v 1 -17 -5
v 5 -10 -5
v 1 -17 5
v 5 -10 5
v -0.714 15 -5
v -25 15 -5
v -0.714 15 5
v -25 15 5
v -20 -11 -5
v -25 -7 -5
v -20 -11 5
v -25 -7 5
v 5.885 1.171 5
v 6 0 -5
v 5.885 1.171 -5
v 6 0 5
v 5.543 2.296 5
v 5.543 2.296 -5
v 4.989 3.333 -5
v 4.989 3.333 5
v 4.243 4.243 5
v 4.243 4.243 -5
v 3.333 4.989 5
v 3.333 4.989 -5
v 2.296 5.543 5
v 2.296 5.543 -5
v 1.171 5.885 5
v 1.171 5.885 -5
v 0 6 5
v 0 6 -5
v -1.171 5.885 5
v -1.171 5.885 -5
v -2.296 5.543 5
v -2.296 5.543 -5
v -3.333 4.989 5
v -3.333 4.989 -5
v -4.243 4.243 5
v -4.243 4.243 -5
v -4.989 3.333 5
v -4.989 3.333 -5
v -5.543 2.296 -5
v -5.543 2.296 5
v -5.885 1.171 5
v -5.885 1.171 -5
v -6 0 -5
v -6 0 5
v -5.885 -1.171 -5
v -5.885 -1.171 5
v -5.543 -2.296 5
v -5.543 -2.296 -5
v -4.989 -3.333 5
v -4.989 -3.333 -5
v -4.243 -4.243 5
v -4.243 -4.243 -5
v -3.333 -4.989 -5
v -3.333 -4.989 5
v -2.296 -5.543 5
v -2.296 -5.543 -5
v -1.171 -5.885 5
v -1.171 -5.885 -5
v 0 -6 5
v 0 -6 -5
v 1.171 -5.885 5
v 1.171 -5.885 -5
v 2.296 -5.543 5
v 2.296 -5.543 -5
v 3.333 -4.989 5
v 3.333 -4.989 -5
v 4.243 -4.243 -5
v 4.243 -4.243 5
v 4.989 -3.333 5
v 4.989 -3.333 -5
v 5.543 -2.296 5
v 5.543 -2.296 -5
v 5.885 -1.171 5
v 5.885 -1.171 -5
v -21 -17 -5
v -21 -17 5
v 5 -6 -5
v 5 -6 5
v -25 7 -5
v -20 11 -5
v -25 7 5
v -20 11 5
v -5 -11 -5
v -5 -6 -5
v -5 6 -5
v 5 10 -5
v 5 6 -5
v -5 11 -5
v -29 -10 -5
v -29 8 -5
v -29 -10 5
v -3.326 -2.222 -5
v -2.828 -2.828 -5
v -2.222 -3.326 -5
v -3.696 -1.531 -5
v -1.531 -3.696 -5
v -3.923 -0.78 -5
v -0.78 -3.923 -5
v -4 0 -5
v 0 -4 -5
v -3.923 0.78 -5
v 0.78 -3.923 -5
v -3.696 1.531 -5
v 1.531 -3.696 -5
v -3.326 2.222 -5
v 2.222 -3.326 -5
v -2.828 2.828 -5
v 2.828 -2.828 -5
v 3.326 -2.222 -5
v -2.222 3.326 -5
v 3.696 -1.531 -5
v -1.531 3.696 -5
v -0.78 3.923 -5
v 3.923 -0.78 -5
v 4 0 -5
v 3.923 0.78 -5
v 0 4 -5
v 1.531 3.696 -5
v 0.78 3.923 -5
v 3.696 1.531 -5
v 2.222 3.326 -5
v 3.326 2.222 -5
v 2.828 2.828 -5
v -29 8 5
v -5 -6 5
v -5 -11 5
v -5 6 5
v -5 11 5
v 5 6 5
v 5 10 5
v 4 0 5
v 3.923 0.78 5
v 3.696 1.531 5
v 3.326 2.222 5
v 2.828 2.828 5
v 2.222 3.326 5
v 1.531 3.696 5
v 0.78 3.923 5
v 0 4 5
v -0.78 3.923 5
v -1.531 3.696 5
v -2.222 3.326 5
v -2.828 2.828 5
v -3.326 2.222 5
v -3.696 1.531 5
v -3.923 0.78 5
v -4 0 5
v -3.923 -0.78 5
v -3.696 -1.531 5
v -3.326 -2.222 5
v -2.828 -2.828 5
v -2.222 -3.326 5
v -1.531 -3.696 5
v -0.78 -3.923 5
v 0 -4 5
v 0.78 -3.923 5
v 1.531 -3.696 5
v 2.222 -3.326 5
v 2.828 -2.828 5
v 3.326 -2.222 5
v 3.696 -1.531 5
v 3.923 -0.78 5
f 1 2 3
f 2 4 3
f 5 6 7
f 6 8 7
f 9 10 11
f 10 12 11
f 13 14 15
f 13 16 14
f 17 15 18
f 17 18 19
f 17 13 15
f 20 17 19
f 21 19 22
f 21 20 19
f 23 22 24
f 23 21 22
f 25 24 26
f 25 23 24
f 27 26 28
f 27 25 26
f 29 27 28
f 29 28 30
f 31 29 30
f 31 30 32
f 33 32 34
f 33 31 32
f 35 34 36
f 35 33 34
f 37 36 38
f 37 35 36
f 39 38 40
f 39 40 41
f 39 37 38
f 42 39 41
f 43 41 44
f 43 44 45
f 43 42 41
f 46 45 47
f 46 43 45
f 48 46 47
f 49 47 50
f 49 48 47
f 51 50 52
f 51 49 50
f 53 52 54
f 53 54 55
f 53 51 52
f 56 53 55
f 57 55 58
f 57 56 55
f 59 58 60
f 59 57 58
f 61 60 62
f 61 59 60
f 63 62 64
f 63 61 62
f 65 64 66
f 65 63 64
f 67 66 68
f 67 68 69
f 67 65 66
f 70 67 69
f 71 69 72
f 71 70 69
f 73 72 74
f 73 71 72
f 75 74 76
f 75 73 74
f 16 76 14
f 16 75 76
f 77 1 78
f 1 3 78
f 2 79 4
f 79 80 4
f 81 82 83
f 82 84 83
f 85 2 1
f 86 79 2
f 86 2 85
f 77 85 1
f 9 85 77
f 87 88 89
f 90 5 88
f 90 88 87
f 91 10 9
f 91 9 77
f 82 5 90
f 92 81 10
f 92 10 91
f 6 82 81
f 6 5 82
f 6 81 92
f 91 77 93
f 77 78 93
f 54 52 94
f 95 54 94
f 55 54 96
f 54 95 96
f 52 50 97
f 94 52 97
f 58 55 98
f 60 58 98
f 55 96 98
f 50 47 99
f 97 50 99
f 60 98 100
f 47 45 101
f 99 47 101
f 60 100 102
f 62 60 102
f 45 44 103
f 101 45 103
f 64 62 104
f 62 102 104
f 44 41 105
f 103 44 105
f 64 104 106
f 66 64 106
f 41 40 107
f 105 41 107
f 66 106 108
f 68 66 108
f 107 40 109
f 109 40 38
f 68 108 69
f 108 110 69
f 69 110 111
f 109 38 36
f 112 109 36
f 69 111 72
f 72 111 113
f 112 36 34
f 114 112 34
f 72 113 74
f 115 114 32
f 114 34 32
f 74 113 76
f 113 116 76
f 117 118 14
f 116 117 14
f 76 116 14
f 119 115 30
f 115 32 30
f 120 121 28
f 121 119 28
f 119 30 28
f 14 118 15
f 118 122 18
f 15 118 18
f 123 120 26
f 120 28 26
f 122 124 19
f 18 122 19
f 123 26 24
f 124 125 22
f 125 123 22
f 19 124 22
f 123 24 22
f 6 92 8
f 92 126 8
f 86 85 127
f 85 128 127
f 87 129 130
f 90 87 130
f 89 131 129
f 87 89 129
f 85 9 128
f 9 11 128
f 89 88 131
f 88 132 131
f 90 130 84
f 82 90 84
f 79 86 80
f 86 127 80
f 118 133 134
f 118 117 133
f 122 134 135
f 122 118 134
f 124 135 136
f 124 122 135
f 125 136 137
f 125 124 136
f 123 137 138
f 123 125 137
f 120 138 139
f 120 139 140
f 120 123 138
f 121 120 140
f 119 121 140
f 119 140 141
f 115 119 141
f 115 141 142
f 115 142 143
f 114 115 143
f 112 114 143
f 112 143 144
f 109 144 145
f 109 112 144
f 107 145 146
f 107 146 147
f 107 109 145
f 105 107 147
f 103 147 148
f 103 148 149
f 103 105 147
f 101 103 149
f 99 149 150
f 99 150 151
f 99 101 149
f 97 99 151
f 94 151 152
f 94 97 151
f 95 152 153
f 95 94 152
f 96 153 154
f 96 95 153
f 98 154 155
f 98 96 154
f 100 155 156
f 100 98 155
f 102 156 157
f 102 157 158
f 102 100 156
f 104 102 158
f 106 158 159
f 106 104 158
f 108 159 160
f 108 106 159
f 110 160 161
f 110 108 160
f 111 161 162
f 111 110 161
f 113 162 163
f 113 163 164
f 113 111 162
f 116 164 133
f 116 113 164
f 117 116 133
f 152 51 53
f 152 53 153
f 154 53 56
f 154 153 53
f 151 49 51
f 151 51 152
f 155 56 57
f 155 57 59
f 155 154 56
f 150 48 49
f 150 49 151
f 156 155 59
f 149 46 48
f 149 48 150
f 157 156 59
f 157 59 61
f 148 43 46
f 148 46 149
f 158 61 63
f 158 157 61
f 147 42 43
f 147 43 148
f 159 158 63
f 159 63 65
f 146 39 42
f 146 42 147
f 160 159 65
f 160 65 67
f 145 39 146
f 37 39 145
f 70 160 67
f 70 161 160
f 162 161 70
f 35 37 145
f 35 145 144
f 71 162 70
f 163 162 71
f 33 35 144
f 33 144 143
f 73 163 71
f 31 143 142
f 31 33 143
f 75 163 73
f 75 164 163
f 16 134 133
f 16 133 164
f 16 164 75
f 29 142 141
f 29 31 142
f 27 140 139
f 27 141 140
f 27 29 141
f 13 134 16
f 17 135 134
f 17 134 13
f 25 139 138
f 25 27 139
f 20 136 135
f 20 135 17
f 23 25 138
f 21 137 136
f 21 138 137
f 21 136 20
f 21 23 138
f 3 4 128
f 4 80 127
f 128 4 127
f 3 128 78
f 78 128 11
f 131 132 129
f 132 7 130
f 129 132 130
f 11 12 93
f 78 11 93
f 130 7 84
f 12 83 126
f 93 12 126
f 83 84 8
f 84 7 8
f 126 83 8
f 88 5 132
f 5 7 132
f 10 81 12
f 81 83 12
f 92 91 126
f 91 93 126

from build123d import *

# Parameters (mm, degrees)
BOSS_EXTRUDE1_DEPTH   = 5
SKETCH1_R             = 6
SKETCH1_R_2           = 4
BOSS_EXTRUDE1_2_DEPTH = 5


with BuildPart() as part:
    # Sketch1 → Boss-Extrude1 (new, symmetric)
    with BuildSketch(Plane.XY):
        Polygon((-5, 11), (-20, 11), (-25, 7), (-25, -7), (-20, -11), (-5, -11), (-5, -6), (5, -6), (5, -10), (1, -17), (-21, -17), (-29, -10), (-29, 8), (-25, 15), (-0.714285714, 15), (5, 10), (5, 6), (-5, 6), align=None)
    extrude(amount=BOSS_EXTRUDE1_DEPTH, both=True)


with BuildPart() as body_2:
    # Sketch1 → Boss-Extrude1 2 (new, symmetric)
    with BuildSketch(Plane.XY):
        Circle(SKETCH1_R)
        Circle(SKETCH1_R_2, mode=Mode.SUBTRACT)
    extrude(amount=BOSS_EXTRUDE1_2_DEPTH, both=True)


solid = Compound([part.part, body_2.part])
